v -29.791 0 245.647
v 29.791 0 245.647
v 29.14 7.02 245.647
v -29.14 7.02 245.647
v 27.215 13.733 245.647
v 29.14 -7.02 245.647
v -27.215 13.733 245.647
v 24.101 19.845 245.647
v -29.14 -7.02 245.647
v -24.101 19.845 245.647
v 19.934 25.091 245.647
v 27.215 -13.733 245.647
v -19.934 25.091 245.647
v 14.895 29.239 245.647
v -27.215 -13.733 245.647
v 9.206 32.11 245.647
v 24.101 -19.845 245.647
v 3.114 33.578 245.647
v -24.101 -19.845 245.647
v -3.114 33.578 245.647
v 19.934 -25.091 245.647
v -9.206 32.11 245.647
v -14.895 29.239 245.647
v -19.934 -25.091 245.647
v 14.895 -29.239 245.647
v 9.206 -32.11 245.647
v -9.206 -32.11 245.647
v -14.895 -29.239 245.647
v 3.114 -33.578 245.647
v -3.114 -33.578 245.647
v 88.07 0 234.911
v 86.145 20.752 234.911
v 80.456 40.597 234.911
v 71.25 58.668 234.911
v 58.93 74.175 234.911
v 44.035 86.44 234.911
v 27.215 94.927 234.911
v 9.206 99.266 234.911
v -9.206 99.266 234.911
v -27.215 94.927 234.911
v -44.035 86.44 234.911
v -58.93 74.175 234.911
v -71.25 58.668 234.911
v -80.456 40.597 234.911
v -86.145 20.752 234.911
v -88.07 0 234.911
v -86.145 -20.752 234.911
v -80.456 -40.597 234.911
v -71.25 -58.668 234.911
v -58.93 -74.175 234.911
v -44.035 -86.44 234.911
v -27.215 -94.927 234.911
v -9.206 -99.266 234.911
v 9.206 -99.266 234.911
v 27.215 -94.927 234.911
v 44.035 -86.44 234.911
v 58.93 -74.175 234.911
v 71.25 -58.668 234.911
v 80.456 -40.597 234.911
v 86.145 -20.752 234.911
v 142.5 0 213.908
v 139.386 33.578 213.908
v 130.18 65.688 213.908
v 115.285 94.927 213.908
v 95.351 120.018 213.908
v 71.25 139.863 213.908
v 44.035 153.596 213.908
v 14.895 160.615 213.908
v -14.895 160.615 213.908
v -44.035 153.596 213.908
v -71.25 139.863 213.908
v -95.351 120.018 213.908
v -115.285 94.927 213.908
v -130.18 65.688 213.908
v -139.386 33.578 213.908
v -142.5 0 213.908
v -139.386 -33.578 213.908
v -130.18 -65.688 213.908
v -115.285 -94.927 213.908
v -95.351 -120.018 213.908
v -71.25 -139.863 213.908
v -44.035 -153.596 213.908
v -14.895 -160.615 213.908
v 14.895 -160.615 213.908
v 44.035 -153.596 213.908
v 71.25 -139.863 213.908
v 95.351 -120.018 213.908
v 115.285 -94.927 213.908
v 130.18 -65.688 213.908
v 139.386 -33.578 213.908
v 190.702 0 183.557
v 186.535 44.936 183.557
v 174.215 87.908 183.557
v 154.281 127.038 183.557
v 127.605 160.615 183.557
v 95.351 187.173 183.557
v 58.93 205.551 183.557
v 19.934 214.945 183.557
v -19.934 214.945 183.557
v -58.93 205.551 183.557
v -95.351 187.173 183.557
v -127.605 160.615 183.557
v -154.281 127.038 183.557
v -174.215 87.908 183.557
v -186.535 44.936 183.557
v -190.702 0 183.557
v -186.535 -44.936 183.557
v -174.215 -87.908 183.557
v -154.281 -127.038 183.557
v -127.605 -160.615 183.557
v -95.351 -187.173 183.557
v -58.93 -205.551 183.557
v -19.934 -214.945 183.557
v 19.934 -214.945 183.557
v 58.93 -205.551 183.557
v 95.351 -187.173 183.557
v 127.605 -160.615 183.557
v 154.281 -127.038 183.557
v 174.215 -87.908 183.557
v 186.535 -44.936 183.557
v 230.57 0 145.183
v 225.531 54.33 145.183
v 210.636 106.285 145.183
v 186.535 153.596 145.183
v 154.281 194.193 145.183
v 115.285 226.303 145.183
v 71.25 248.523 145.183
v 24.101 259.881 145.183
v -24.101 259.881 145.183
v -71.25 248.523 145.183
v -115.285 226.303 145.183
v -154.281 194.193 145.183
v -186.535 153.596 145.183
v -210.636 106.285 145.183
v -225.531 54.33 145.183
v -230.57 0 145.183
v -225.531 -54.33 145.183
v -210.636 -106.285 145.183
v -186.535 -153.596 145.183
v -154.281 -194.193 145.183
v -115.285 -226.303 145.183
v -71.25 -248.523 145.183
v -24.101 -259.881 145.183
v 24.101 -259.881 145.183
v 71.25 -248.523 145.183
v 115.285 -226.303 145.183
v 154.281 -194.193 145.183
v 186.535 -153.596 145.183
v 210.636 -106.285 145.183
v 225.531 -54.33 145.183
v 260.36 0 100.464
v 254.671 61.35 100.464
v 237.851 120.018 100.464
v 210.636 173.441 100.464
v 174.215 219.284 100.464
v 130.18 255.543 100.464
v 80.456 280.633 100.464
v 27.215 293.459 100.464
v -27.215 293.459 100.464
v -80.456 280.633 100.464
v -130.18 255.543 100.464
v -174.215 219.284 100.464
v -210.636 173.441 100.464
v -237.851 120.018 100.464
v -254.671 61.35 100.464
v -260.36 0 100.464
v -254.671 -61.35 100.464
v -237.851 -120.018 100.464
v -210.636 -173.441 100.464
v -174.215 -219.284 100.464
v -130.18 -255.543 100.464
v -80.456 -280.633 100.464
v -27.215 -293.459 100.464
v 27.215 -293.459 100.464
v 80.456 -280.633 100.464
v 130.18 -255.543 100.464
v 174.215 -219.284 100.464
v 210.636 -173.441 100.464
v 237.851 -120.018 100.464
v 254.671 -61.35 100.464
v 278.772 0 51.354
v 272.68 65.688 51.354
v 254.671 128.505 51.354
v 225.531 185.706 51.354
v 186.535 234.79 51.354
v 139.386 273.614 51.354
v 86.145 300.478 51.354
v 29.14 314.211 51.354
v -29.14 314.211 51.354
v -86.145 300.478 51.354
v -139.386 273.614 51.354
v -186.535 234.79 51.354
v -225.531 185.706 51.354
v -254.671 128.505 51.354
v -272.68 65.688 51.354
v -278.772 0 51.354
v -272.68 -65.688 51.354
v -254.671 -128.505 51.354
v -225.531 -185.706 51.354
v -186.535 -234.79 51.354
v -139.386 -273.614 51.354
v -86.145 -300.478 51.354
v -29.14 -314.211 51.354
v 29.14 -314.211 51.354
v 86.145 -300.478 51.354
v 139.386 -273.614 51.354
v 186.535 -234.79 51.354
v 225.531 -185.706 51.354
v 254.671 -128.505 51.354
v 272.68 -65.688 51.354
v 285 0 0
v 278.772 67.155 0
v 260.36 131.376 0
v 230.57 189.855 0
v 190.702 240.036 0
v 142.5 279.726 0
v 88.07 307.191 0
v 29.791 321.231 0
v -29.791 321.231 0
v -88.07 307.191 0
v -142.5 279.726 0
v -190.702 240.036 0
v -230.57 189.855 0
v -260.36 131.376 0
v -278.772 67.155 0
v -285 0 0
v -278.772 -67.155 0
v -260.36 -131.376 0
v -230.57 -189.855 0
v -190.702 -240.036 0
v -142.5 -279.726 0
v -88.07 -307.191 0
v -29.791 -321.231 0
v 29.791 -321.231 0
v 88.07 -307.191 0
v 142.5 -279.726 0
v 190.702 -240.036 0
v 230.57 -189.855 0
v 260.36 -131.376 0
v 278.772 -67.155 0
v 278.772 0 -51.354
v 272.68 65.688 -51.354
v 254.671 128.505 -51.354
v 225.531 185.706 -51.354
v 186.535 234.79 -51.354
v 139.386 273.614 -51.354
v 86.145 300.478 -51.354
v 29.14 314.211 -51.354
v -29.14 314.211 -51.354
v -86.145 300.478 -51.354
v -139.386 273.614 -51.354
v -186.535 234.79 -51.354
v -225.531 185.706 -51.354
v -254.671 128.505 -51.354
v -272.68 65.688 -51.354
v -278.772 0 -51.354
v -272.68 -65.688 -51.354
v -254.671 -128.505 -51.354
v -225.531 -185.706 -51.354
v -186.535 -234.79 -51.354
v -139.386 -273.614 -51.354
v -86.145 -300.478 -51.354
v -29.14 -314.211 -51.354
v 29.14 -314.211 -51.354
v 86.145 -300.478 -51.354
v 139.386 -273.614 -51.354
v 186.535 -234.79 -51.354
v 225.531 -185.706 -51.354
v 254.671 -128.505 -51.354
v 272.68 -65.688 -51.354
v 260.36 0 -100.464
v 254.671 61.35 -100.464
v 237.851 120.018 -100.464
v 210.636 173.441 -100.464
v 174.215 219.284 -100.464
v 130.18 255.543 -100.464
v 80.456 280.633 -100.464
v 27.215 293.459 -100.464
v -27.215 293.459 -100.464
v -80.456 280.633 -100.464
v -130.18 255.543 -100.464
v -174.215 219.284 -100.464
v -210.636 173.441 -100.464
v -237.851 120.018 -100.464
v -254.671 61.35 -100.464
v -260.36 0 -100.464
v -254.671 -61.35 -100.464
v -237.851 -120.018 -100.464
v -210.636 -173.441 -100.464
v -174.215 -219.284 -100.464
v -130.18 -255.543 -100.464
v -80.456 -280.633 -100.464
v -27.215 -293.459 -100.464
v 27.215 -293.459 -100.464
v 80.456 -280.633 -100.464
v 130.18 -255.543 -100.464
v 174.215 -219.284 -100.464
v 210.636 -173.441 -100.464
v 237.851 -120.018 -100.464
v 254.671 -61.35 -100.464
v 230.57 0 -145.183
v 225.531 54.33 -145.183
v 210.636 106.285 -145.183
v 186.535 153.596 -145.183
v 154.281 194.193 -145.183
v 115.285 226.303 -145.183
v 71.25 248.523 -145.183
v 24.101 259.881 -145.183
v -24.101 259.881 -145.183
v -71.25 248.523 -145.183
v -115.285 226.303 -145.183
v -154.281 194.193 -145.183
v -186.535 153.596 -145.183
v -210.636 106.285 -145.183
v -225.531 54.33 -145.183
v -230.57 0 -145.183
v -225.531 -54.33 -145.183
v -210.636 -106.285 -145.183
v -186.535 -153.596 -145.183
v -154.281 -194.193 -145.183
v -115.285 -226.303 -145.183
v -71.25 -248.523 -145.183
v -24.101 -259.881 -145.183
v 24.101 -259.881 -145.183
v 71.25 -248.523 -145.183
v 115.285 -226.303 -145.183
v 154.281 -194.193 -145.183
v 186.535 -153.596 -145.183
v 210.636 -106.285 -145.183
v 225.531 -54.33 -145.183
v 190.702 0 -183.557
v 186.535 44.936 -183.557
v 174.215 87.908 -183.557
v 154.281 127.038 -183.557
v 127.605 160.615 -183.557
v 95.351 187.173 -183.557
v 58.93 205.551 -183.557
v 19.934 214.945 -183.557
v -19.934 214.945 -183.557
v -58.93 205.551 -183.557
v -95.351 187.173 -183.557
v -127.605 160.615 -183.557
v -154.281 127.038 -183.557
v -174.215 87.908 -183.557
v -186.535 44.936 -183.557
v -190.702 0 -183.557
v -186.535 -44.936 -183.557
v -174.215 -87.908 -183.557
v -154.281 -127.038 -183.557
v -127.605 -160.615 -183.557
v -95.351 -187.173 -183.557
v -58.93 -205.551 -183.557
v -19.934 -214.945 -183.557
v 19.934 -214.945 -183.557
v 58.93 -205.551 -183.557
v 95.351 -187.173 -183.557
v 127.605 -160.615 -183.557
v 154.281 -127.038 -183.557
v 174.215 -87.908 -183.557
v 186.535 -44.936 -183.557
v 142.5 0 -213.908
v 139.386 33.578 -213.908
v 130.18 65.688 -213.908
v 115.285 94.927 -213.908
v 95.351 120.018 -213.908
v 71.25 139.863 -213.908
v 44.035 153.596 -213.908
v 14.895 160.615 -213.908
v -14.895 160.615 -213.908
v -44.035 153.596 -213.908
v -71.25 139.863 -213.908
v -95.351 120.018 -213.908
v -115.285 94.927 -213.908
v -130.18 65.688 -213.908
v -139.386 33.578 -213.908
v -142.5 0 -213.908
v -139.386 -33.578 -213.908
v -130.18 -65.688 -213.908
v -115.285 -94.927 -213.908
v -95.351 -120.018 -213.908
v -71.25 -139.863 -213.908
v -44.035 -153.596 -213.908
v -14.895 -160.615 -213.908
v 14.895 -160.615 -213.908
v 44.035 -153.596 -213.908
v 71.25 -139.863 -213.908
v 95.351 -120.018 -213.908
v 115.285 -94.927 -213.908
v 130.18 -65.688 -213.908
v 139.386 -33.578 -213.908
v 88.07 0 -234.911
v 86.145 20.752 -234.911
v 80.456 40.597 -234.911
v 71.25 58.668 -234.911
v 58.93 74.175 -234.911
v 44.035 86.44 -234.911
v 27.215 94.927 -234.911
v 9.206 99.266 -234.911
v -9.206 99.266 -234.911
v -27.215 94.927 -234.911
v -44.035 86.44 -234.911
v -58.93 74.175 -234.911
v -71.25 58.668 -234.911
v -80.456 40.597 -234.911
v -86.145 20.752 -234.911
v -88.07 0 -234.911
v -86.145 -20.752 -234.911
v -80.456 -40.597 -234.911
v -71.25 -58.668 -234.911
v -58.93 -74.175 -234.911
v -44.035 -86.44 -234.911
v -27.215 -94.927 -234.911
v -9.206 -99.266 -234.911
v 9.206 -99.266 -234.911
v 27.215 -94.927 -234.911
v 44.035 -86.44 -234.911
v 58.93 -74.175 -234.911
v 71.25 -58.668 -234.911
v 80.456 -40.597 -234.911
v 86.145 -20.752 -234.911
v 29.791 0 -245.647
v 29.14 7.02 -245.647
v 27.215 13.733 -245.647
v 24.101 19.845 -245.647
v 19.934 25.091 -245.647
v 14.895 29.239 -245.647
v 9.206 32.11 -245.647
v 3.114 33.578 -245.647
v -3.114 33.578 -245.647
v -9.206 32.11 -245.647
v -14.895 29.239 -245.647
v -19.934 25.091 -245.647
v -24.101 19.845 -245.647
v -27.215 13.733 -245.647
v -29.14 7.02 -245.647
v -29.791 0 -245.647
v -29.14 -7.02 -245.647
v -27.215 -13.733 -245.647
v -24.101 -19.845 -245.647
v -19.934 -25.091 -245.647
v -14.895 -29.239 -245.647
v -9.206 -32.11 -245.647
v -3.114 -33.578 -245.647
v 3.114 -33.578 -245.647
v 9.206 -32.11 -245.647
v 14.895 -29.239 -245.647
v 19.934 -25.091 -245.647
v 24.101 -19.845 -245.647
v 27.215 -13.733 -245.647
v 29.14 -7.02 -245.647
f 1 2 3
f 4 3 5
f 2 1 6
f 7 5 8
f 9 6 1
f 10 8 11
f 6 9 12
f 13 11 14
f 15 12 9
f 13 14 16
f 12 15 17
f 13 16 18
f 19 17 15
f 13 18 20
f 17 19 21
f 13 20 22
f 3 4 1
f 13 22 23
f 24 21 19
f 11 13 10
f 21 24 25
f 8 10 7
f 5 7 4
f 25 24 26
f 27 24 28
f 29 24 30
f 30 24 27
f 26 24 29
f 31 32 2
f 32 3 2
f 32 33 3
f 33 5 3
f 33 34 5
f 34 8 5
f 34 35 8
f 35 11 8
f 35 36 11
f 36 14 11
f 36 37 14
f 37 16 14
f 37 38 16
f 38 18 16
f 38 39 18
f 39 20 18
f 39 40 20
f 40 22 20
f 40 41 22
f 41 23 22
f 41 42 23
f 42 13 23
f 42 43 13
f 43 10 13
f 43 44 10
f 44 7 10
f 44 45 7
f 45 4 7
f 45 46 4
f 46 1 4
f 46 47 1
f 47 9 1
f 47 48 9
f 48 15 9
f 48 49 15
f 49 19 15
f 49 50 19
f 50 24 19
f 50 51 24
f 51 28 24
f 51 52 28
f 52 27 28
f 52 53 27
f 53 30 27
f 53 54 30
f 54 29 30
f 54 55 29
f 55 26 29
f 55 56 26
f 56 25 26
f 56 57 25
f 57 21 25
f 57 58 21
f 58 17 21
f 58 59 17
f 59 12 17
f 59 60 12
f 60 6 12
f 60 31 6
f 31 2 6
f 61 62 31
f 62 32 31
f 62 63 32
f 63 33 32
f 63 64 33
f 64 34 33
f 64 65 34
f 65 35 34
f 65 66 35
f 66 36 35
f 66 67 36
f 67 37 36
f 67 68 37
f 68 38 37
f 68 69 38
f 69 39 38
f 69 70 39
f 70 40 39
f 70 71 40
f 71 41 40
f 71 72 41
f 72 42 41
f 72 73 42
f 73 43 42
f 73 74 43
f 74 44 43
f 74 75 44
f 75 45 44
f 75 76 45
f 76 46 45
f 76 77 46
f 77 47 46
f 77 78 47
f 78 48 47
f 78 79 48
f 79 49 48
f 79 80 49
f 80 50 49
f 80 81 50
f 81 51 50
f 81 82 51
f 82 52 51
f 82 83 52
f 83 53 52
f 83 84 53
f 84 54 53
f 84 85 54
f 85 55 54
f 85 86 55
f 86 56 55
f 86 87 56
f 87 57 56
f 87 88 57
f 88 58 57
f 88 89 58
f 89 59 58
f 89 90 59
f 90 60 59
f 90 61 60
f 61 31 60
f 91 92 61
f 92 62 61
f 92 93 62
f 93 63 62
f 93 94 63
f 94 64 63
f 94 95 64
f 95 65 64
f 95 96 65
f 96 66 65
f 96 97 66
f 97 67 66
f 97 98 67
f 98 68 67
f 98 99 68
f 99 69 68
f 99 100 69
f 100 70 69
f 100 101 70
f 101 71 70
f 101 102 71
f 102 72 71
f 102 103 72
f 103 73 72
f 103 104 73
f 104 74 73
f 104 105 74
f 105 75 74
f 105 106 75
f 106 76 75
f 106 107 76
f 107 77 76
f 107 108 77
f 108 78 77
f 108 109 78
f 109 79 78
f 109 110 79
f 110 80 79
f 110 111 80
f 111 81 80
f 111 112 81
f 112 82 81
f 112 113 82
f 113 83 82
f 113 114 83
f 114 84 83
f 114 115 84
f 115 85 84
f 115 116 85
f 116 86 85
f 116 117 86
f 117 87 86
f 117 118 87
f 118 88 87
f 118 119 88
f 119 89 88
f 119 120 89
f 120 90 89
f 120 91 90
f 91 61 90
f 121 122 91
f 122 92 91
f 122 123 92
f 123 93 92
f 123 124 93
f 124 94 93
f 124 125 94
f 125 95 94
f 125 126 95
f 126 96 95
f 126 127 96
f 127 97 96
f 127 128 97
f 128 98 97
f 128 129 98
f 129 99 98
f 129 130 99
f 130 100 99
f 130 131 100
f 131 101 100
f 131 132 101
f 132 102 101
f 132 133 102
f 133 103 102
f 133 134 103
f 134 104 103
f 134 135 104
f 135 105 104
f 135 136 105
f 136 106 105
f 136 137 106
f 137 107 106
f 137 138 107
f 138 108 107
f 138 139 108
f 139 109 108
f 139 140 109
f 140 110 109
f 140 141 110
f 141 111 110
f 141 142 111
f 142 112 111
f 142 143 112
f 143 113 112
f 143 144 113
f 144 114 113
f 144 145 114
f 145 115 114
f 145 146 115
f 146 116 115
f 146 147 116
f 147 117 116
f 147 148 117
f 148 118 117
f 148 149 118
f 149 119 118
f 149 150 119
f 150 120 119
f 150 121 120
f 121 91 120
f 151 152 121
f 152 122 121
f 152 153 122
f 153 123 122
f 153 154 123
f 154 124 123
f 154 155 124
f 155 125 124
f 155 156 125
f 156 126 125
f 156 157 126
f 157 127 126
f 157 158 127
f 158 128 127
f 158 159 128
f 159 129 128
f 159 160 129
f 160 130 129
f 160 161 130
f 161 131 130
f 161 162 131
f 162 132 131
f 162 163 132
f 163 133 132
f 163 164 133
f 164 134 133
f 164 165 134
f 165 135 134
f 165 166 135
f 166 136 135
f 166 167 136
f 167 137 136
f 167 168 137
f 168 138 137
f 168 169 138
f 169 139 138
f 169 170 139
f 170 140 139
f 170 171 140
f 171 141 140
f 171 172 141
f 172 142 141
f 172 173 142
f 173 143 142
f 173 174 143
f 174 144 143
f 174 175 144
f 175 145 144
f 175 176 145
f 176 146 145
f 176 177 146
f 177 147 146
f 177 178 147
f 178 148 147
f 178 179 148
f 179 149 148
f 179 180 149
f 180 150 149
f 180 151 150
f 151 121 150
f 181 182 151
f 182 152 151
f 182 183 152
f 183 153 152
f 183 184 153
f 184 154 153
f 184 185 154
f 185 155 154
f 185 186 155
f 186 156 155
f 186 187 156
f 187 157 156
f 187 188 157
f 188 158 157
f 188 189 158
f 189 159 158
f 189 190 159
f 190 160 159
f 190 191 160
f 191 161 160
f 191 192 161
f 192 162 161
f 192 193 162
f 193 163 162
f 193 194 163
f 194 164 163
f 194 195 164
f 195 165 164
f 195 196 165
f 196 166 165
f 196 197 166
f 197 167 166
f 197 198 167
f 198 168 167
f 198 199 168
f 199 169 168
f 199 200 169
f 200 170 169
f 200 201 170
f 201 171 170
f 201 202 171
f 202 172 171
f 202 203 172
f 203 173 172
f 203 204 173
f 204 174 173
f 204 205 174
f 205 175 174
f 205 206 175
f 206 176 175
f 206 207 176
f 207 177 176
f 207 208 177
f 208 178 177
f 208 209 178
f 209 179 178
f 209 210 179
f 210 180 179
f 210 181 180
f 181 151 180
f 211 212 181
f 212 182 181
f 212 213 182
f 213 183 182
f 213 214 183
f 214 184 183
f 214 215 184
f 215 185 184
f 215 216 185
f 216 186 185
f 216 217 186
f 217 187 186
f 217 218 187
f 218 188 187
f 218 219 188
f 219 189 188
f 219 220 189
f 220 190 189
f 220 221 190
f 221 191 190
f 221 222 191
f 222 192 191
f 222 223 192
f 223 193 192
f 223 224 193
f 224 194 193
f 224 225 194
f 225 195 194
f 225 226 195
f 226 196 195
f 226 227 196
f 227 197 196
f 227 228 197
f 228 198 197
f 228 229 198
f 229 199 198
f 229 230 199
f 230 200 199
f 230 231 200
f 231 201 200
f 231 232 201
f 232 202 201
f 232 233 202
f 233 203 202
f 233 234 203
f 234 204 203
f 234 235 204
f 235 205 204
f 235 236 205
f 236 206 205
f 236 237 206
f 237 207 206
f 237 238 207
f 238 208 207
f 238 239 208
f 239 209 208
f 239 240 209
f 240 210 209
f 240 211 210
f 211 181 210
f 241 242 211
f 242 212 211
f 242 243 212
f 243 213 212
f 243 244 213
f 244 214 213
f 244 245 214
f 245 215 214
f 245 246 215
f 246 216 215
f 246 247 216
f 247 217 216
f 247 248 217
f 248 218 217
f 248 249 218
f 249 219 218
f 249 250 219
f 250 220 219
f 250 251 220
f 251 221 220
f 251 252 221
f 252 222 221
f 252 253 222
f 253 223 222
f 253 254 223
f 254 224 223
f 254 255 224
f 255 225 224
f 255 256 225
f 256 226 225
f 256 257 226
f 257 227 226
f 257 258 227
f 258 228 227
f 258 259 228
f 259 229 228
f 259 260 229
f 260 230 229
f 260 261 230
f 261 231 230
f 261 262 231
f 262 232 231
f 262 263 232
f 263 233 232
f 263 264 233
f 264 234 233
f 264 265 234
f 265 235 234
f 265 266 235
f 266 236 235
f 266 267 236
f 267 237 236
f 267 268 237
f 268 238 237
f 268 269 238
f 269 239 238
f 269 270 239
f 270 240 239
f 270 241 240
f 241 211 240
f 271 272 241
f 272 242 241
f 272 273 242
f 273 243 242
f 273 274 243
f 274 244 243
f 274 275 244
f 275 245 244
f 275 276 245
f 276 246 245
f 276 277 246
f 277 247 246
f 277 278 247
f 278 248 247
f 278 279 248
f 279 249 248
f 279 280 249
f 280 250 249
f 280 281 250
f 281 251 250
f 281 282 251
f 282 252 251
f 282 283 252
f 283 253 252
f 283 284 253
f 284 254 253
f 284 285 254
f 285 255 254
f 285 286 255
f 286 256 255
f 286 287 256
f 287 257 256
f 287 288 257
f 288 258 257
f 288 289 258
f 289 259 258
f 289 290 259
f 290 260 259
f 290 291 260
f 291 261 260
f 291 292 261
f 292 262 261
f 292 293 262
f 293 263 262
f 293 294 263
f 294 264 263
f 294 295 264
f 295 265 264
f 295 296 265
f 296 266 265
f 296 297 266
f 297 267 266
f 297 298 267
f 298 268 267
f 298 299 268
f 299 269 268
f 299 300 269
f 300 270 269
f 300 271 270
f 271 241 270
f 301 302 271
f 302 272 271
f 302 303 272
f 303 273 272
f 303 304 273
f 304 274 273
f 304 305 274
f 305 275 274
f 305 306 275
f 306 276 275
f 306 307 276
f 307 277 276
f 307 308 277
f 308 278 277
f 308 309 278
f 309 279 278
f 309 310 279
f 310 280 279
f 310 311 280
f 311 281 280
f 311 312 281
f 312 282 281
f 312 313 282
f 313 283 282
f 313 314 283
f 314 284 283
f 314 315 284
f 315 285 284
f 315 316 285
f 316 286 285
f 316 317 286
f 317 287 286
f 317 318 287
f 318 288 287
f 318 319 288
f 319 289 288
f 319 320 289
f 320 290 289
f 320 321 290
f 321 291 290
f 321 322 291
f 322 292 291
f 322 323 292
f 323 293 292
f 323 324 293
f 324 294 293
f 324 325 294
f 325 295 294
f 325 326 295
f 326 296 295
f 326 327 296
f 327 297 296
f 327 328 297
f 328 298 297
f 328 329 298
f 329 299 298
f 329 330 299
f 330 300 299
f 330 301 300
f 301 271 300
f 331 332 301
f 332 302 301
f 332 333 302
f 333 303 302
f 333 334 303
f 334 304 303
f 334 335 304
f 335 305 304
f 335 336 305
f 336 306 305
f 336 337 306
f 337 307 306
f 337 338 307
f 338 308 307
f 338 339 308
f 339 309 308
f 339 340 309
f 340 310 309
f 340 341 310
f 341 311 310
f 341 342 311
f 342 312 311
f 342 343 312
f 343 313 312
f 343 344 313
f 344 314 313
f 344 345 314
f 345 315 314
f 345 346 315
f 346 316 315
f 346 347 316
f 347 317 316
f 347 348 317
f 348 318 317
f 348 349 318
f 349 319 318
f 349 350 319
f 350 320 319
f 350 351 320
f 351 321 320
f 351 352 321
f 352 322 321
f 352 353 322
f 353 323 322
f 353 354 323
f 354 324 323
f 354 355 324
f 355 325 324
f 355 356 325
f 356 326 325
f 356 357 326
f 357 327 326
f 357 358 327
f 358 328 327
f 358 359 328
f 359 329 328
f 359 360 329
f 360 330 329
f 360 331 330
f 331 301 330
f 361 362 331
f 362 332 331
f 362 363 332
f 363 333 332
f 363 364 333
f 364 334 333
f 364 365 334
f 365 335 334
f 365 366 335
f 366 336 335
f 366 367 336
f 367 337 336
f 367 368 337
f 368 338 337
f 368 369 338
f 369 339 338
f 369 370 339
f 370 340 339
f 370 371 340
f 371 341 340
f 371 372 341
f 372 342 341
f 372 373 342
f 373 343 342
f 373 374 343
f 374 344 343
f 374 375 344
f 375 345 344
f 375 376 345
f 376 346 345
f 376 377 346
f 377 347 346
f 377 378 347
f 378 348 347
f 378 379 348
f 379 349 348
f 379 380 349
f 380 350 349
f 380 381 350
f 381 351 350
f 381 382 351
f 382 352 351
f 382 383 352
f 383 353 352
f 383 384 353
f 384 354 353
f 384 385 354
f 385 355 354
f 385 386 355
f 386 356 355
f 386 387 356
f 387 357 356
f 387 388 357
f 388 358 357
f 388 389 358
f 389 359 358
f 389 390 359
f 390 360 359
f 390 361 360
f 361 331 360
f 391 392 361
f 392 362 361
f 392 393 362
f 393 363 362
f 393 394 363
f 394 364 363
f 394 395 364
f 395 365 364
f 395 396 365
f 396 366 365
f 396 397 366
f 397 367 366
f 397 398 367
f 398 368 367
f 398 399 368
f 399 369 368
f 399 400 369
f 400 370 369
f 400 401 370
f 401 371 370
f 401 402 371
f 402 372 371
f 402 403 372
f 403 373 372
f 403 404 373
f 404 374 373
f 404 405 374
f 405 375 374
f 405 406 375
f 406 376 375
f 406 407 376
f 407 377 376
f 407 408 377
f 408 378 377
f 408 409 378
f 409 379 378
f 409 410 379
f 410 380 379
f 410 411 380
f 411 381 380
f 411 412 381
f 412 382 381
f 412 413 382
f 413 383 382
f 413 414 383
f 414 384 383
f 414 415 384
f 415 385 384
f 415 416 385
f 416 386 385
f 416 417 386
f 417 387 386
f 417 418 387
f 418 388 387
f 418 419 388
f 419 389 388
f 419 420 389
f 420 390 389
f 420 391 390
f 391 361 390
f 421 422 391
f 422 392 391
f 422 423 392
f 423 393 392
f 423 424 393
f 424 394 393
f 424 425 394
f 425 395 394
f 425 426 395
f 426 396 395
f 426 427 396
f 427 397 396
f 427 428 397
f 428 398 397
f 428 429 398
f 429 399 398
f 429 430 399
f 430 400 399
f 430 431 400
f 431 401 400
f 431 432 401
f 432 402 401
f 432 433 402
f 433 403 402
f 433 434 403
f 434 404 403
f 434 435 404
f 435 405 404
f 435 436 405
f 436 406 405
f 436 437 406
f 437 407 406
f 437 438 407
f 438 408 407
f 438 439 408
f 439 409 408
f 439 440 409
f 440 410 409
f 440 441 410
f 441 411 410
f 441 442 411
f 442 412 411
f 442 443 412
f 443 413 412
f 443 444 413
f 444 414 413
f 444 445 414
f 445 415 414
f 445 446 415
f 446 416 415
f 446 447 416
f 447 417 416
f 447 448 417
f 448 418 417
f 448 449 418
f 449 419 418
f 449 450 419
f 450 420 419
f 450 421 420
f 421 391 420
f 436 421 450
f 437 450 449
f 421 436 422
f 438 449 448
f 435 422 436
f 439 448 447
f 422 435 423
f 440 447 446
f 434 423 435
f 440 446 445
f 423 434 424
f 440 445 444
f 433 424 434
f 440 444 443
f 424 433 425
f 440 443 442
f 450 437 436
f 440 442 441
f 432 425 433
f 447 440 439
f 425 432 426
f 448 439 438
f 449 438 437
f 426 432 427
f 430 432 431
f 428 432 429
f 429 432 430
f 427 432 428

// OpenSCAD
// Generated by SolidPython 1.0.1 on 2020-07-29 00:46:52


scale(v = [15, 17, 13]) {
	sphere(r = 19);
}
/***********************************************
*********      SolidPython code:      **********
************************************************
 
# import packages: SolidPython
from solid import *
from solid.utils import *
from itertools import chain, combinations, permutations


class Resize:

    def __init__(self, scad_file):
        self.scad_file = scad_file
        #self.scad_file = import_scad(scad_file)
        # cone/cylinder param:
        self.r1 = 0
        self.r2 = 0
        self.h = 0
        # rectangular prism param:
        self.w = 0
        self.l = 0
        # ellipse param:
        self.r = 0

    # import OpenScad code (file name corresponds to shape)


    # classify shape + parameters
    def assign(self, param1, param2, param3):
        if self.scad_file == 'cone.scad':
            self.r1 = param1
            self.r2 = param2
            self.h = param3
        elif self.scad_file == 'cylinder.scad':
            self.r1 = param1
            self.r2 = param2
            self.h = param3
        elif self.scad_file == 'rectangularPrism.scad':
            self.h = param1
            self.l = param2
            self.w = param3
        else:
            self.r = param1
            self.h = param2

    # resize parameters
    def iterate(self):
        x = range(3, 20, 2)
        i = 1
        if self.scad_file == 'cone.scad':
            tempList = list(permutations(x, 2))
            for temp in tempList:
                param1 = temp[0]
                param2 = temp[1]
                filepath = 'produced_scad_files/' + 'cone' + str(param1) + '_' + str(param2) + '_' + '.scad'
                scad_render_to_file(cylinder(h=param1, r1=param2, r2=0), filepath)

        elif self.scad_file == 'cylinder.scad':
            tempList = list(permutations(x, 3))
            for temp in tempList:
                param1 = temp[0]
                param2 = temp[1]
                filepath = 'produced_scad_files/' + 'cylinder' + str(param1) + '_' + str(param2) + '_' + '.scad'
                scad_render_to_file(cylinder(h=param1, r1=param2, r2=param2), filepath)

        elif self.scad_file == 'rectangularPrism.scad':
            tempList = list(permutations(x, 3))
            for temp in tempList:
                param1 = temp[0]
                param2 = temp[1]
                param3 = temp[2]
                filepath = 'produced_scad_files/' + 'rectangularPrism' + str(param1) + '_' + str(param2) + '_' + str(
                    param3) + '.scad'
                scad_render_to_file(cube(size=(param1, param2, param3)), filepath)

        elif self.scad_file == 'ellipse.scad':
            tempList = list(permutations(x, 4))
            for temp in tempList:
                param1 = temp[0]
                param2 = temp[1]
                param3 = temp[2]
                param4 = temp[3]
                filepath = 'produced_scad_files/' + 'ellipse' + str(param1) + '_' + str(param2) + '_' + str(param3) + '_' + str(param4) + '.scad'
                scad_render_to_file(scale([param1, param2, param3])(sphere(r=param4)), filepath)

    def render_to_scadfile(self):
        scad_render_to_file(scad, 'example.scad') 
 
************************************************/
